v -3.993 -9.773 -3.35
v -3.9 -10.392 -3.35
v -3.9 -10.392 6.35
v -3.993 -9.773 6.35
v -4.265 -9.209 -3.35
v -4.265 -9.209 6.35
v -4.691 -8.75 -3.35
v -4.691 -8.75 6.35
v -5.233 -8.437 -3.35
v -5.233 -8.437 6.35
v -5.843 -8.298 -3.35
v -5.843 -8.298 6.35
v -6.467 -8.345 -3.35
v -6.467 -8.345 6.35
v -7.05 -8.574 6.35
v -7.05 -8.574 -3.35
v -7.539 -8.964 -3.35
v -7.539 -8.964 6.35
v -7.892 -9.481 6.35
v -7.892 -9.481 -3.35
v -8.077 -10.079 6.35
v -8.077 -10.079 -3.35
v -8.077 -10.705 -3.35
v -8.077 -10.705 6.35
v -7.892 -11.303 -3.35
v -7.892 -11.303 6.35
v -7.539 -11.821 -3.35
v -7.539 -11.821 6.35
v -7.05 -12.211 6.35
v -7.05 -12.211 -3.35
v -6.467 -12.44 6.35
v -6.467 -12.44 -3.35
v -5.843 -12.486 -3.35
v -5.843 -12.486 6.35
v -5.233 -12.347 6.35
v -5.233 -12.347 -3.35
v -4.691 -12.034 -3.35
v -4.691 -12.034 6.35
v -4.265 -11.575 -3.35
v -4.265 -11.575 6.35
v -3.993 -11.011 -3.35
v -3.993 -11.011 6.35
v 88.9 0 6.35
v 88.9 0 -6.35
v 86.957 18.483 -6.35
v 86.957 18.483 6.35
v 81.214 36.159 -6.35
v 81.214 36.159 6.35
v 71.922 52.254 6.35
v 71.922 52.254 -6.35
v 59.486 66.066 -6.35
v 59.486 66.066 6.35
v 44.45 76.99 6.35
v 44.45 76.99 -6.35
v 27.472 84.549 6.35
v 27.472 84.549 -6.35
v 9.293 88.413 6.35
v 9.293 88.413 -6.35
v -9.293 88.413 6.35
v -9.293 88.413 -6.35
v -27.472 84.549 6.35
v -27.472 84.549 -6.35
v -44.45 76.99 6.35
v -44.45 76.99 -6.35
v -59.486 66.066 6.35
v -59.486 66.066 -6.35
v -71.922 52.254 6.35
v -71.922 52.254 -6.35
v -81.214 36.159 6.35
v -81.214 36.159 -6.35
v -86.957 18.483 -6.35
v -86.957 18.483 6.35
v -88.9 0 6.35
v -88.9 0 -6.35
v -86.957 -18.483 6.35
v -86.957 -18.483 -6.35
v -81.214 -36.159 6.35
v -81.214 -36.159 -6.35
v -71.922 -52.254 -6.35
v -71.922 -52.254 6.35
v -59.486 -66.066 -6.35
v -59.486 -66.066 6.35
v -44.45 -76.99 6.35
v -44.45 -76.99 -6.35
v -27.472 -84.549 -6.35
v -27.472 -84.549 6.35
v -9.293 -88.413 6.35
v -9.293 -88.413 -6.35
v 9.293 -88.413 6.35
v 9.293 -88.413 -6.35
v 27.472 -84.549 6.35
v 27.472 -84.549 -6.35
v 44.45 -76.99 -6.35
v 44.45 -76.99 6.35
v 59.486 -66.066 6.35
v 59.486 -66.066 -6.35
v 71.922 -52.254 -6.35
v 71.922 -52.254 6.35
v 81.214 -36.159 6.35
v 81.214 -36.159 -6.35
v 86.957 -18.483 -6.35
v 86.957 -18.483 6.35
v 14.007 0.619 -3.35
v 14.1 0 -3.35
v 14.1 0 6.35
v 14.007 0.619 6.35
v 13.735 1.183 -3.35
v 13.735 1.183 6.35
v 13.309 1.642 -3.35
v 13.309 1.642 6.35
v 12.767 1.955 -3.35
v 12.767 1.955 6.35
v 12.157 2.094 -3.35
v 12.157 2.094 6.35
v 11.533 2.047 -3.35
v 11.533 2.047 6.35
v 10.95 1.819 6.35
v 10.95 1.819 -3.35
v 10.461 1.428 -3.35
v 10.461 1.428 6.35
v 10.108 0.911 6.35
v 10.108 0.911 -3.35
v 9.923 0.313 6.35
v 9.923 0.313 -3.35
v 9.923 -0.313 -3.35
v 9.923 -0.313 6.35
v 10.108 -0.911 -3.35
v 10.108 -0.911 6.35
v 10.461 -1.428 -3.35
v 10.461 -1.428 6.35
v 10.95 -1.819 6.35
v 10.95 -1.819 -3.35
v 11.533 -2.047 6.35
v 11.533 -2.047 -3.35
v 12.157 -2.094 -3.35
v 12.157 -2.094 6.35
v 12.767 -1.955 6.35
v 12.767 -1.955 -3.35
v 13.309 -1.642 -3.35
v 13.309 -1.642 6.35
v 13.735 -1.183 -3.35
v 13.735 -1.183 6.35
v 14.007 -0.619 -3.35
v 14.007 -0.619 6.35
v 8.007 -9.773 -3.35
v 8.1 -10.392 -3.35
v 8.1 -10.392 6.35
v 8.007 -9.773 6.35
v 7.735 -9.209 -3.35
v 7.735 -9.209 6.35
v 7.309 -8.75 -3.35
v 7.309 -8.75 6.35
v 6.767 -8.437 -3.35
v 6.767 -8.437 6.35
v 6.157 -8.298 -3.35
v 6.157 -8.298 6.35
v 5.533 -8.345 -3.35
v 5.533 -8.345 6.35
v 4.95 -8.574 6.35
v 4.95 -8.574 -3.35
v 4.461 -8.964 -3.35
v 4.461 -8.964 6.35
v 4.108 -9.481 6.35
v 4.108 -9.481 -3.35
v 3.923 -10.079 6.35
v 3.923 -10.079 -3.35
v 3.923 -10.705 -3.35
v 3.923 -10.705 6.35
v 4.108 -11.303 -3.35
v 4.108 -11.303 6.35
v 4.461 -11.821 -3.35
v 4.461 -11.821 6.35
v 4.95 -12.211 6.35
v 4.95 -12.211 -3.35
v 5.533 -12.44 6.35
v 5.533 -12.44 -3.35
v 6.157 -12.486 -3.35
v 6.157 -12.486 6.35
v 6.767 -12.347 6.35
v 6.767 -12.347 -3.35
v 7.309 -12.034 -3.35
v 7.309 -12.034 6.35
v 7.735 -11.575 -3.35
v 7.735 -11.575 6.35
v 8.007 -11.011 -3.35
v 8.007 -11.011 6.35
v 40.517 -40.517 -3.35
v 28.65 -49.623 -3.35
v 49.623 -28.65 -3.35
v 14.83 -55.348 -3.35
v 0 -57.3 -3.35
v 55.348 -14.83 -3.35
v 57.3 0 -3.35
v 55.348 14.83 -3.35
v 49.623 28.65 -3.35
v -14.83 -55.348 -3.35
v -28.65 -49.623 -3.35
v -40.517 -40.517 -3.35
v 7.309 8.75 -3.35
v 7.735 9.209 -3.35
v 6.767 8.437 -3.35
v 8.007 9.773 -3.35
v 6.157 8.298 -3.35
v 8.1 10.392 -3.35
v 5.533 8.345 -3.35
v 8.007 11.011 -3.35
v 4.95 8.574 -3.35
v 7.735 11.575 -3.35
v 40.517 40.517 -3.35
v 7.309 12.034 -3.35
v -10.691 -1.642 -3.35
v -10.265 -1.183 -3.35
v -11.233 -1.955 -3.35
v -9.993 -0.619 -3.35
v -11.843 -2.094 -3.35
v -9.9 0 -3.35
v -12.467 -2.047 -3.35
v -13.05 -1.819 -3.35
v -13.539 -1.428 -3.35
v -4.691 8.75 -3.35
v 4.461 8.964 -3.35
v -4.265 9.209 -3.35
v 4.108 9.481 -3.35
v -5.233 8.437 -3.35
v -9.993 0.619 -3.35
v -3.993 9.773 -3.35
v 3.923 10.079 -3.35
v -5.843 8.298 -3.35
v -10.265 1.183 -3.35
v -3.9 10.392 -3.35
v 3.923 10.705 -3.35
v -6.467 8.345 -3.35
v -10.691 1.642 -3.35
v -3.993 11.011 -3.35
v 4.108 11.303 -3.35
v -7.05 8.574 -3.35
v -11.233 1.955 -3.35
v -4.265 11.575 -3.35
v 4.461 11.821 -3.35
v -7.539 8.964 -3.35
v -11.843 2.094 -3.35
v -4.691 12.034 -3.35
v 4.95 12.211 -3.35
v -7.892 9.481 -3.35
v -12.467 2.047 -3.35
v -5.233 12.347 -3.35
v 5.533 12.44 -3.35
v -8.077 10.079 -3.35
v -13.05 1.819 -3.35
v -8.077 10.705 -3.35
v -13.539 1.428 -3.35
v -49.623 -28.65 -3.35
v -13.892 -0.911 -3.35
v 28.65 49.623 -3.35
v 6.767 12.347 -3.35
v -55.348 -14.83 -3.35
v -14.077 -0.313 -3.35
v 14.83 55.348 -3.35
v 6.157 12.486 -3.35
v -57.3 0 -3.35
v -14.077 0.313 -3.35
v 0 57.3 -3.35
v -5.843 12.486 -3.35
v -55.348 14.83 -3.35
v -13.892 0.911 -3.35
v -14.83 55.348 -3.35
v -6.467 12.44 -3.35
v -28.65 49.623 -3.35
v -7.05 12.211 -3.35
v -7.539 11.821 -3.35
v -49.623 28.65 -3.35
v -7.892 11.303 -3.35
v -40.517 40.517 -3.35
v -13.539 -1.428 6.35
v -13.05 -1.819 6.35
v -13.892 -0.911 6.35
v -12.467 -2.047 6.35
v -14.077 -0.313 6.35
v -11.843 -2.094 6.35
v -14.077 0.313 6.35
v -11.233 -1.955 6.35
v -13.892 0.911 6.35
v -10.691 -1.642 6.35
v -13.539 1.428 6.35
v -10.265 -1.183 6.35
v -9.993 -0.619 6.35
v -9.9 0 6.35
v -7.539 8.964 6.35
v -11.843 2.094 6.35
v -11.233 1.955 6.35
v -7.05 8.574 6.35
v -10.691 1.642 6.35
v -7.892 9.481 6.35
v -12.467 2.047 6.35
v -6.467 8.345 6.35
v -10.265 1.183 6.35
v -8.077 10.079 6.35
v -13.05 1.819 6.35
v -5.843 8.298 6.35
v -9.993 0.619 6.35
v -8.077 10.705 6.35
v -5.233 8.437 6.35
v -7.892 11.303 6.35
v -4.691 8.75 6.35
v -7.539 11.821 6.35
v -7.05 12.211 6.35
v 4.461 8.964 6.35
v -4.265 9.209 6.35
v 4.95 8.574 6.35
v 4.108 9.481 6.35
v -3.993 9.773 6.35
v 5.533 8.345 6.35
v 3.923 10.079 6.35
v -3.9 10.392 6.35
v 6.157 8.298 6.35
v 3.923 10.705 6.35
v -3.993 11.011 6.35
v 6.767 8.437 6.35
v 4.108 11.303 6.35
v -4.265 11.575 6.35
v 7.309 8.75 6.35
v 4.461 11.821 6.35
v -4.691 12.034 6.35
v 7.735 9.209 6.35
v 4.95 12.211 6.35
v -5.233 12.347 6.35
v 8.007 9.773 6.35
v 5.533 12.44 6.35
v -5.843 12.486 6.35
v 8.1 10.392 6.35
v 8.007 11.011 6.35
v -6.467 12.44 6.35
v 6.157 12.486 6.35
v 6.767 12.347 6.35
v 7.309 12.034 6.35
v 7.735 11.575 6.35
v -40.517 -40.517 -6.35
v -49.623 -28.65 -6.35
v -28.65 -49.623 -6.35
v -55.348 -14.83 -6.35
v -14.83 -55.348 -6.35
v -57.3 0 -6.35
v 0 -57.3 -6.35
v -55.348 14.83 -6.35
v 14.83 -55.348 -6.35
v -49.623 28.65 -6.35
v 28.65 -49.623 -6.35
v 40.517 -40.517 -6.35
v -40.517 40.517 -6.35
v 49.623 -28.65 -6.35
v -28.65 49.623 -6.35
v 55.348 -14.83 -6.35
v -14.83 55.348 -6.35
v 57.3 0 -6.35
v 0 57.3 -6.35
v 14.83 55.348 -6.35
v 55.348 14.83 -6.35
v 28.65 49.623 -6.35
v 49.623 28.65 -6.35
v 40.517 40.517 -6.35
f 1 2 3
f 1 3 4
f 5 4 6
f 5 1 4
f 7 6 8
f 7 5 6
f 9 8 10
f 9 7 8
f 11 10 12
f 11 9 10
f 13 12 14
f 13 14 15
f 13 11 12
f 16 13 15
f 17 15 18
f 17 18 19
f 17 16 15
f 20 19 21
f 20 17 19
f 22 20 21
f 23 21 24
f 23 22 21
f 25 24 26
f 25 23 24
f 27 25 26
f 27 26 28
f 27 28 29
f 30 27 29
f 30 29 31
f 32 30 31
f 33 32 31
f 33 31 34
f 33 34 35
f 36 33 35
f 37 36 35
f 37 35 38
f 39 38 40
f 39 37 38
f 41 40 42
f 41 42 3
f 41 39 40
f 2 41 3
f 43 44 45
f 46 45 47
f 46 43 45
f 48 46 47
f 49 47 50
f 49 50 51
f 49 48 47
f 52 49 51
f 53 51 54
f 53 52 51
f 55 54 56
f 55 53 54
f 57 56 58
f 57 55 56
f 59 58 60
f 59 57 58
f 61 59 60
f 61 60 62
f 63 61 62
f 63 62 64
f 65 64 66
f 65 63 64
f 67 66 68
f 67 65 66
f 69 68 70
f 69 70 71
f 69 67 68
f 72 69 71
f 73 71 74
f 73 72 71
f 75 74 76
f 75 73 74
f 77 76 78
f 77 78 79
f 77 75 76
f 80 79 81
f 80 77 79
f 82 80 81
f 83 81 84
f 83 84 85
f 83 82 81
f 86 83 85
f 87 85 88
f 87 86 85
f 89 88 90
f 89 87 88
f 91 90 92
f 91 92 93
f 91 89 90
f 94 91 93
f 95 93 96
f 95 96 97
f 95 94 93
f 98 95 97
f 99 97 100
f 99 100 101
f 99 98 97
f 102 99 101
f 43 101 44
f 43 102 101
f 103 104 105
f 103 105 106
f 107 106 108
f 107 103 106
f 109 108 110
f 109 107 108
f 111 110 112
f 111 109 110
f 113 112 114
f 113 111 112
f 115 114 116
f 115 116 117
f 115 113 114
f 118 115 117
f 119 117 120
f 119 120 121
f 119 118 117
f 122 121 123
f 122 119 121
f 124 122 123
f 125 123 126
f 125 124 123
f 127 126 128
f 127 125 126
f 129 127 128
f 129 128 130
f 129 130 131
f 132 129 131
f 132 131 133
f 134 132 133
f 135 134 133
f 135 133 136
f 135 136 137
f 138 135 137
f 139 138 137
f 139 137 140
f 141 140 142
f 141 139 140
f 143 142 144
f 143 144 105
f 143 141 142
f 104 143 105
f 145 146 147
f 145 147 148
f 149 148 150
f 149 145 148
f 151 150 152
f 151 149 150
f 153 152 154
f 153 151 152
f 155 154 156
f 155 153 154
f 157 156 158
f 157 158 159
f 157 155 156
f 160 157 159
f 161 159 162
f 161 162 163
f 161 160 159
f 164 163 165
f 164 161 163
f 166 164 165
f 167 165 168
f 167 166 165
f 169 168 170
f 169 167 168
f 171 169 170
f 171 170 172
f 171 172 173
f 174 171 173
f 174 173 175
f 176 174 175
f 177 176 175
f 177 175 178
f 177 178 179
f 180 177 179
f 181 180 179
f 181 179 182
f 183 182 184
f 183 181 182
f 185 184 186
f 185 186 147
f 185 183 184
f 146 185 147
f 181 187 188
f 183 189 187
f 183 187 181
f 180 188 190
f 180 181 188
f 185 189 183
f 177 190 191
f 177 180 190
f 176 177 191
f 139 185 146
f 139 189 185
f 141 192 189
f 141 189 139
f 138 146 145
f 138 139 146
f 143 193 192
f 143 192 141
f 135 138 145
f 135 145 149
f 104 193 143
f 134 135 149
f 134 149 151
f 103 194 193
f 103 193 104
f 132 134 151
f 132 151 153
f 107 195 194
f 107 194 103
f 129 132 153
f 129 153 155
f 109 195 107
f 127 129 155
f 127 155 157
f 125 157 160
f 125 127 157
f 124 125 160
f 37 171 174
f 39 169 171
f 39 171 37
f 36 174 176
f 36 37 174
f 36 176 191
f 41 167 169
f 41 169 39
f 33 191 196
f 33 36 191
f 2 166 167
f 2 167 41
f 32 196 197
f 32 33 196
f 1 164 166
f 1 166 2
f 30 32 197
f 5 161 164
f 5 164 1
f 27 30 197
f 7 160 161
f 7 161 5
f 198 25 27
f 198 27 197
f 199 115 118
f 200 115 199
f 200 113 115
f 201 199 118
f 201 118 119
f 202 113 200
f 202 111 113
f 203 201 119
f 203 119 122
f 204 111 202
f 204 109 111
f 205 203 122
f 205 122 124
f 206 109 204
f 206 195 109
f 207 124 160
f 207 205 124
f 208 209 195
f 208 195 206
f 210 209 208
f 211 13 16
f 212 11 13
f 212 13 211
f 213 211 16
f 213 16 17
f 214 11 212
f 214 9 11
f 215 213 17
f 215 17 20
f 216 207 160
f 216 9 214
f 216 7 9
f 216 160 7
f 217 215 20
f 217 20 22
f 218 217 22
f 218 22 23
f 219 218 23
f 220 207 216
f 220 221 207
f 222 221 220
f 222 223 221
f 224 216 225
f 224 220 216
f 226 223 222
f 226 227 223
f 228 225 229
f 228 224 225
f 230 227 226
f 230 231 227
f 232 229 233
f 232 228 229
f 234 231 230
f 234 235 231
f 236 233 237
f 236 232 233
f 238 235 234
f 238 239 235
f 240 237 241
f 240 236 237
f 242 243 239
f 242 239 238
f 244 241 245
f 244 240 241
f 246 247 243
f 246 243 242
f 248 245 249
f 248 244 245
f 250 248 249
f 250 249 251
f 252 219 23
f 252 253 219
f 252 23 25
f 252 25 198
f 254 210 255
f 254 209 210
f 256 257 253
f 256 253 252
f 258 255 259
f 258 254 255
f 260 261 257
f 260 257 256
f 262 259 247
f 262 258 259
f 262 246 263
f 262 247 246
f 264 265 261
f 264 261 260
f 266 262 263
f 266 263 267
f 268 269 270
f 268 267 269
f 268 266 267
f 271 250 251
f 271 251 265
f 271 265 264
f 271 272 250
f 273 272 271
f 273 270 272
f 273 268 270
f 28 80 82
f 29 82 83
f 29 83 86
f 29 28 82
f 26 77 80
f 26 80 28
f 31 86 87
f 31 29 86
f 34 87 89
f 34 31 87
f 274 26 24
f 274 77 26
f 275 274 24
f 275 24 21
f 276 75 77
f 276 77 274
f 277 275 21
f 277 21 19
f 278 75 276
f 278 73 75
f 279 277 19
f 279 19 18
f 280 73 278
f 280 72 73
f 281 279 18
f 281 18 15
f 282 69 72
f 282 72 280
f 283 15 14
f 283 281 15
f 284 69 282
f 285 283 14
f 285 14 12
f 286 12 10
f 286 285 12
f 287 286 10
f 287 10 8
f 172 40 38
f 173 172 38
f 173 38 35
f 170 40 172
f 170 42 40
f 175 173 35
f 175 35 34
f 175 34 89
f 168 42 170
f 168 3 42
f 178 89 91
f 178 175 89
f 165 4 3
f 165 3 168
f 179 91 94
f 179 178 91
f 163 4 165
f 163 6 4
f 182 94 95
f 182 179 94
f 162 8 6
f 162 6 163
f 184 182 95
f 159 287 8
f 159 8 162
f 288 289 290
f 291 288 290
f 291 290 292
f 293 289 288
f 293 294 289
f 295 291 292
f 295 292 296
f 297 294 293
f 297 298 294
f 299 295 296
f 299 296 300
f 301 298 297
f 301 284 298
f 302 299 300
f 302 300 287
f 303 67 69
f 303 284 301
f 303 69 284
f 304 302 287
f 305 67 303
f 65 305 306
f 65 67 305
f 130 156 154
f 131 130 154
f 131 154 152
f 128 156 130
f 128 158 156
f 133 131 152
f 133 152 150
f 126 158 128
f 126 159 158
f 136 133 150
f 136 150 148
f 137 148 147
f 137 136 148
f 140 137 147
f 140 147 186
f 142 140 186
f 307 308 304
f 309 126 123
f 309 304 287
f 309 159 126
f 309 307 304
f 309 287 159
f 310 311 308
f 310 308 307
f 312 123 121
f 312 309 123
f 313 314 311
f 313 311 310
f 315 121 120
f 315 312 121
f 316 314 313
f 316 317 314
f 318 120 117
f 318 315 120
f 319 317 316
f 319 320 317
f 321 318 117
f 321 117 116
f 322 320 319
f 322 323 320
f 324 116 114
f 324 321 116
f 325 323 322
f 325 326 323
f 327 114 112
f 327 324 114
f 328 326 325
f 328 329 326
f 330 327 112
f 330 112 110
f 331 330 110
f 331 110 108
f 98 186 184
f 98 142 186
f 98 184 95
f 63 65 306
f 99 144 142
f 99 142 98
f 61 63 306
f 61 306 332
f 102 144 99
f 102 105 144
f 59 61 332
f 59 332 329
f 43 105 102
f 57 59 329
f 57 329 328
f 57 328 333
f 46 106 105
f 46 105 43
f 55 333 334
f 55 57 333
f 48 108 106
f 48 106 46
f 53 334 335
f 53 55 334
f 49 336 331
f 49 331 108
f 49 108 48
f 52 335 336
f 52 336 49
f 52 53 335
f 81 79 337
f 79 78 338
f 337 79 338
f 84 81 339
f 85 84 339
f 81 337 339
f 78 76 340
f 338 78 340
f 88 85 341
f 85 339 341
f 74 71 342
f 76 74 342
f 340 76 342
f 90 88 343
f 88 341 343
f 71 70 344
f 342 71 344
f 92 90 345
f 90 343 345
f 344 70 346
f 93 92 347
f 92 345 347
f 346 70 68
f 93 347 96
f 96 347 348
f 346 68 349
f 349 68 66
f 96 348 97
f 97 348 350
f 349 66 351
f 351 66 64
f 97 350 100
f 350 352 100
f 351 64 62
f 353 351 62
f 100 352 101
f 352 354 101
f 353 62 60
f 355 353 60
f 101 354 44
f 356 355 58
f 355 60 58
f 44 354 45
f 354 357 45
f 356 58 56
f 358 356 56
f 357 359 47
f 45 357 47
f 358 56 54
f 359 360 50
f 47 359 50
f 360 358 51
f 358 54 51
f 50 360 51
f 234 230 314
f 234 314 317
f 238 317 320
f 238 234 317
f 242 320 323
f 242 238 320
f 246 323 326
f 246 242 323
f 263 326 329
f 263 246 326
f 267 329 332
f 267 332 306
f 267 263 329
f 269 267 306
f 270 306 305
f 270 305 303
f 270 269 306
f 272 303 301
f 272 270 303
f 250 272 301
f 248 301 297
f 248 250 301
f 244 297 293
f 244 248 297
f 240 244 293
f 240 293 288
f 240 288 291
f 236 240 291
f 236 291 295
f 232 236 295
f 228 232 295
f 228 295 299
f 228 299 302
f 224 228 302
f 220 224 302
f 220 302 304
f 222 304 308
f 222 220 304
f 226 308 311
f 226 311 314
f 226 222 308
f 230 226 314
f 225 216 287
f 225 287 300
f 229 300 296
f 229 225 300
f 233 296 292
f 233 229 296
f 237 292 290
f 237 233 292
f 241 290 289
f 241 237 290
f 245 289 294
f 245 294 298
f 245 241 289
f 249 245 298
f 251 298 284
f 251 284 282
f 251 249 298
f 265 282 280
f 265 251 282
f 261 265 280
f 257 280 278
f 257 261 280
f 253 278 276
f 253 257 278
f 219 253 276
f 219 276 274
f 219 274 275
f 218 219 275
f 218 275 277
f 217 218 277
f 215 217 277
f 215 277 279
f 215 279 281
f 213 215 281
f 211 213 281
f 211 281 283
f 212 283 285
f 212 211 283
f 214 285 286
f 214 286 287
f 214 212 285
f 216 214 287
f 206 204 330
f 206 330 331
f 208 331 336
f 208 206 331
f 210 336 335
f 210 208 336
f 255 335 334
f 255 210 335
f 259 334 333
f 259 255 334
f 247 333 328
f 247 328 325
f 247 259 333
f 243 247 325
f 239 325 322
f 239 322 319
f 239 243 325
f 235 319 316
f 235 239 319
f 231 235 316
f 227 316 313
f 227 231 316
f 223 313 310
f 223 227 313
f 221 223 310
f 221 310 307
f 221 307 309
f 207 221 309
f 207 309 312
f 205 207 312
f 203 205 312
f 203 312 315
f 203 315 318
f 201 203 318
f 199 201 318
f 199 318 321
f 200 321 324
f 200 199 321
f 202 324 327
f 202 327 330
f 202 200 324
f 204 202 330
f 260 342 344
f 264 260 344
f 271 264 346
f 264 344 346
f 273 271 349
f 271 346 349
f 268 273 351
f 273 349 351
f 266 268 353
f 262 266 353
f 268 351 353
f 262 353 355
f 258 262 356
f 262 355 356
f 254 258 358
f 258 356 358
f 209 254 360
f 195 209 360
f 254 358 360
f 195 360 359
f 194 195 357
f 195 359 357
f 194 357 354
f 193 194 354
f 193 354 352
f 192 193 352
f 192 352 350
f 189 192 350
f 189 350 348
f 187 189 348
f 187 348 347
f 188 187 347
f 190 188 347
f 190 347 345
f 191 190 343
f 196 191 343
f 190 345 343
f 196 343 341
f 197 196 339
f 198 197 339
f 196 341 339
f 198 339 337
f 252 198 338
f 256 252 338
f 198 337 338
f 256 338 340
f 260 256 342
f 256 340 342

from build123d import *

# Parameters (mm, degrees)
SKETCH1_R           = 88.9
SKETCH1_R_2         = 2.1
BOSS_EXTRUDE1_DEPTH = 6.35
SKETCH2_R           = 57.3
CUT_EXTRUDE1_DEPTH  = 3


with BuildPart() as part:
    # Sketch1 → Boss-Extrude1 (new, symmetric)
    with BuildSketch(Plane.XY):
        Circle(SKETCH1_R)
        with Locations((-12, 0)):
            Circle(SKETCH1_R_2, mode=Mode.SUBTRACT)
        with Locations((-6, 10.392304845)):
            Circle(SKETCH1_R_2, mode=Mode.SUBTRACT)
        with Locations((6, 10.392304845)):
            Circle(SKETCH1_R_2, mode=Mode.SUBTRACT)
        with Locations((12, 0)):
            Circle(SKETCH1_R_2, mode=Mode.SUBTRACT)
        with Locations((6, -10.392304845)):
            Circle(SKETCH1_R_2, mode=Mode.SUBTRACT)
        with Locations((-6, -10.392304845)):
            Circle(SKETCH1_R_2, mode=Mode.SUBTRACT)
    extrude(amount=BOSS_EXTRUDE1_DEPTH, both=True)

    # Sketch2 → Cut-Extrude1 (cut)
    with BuildSketch(Plane(origin=(0, 0, -6.35), x_dir=(-1, 0, 0), z_dir=(0, 0, -1))):
        Circle(SKETCH2_R)
    extrude(amount=-CUT_EXTRUDE1_DEPTH, mode=Mode.SUBTRACT)


solid = part.part
